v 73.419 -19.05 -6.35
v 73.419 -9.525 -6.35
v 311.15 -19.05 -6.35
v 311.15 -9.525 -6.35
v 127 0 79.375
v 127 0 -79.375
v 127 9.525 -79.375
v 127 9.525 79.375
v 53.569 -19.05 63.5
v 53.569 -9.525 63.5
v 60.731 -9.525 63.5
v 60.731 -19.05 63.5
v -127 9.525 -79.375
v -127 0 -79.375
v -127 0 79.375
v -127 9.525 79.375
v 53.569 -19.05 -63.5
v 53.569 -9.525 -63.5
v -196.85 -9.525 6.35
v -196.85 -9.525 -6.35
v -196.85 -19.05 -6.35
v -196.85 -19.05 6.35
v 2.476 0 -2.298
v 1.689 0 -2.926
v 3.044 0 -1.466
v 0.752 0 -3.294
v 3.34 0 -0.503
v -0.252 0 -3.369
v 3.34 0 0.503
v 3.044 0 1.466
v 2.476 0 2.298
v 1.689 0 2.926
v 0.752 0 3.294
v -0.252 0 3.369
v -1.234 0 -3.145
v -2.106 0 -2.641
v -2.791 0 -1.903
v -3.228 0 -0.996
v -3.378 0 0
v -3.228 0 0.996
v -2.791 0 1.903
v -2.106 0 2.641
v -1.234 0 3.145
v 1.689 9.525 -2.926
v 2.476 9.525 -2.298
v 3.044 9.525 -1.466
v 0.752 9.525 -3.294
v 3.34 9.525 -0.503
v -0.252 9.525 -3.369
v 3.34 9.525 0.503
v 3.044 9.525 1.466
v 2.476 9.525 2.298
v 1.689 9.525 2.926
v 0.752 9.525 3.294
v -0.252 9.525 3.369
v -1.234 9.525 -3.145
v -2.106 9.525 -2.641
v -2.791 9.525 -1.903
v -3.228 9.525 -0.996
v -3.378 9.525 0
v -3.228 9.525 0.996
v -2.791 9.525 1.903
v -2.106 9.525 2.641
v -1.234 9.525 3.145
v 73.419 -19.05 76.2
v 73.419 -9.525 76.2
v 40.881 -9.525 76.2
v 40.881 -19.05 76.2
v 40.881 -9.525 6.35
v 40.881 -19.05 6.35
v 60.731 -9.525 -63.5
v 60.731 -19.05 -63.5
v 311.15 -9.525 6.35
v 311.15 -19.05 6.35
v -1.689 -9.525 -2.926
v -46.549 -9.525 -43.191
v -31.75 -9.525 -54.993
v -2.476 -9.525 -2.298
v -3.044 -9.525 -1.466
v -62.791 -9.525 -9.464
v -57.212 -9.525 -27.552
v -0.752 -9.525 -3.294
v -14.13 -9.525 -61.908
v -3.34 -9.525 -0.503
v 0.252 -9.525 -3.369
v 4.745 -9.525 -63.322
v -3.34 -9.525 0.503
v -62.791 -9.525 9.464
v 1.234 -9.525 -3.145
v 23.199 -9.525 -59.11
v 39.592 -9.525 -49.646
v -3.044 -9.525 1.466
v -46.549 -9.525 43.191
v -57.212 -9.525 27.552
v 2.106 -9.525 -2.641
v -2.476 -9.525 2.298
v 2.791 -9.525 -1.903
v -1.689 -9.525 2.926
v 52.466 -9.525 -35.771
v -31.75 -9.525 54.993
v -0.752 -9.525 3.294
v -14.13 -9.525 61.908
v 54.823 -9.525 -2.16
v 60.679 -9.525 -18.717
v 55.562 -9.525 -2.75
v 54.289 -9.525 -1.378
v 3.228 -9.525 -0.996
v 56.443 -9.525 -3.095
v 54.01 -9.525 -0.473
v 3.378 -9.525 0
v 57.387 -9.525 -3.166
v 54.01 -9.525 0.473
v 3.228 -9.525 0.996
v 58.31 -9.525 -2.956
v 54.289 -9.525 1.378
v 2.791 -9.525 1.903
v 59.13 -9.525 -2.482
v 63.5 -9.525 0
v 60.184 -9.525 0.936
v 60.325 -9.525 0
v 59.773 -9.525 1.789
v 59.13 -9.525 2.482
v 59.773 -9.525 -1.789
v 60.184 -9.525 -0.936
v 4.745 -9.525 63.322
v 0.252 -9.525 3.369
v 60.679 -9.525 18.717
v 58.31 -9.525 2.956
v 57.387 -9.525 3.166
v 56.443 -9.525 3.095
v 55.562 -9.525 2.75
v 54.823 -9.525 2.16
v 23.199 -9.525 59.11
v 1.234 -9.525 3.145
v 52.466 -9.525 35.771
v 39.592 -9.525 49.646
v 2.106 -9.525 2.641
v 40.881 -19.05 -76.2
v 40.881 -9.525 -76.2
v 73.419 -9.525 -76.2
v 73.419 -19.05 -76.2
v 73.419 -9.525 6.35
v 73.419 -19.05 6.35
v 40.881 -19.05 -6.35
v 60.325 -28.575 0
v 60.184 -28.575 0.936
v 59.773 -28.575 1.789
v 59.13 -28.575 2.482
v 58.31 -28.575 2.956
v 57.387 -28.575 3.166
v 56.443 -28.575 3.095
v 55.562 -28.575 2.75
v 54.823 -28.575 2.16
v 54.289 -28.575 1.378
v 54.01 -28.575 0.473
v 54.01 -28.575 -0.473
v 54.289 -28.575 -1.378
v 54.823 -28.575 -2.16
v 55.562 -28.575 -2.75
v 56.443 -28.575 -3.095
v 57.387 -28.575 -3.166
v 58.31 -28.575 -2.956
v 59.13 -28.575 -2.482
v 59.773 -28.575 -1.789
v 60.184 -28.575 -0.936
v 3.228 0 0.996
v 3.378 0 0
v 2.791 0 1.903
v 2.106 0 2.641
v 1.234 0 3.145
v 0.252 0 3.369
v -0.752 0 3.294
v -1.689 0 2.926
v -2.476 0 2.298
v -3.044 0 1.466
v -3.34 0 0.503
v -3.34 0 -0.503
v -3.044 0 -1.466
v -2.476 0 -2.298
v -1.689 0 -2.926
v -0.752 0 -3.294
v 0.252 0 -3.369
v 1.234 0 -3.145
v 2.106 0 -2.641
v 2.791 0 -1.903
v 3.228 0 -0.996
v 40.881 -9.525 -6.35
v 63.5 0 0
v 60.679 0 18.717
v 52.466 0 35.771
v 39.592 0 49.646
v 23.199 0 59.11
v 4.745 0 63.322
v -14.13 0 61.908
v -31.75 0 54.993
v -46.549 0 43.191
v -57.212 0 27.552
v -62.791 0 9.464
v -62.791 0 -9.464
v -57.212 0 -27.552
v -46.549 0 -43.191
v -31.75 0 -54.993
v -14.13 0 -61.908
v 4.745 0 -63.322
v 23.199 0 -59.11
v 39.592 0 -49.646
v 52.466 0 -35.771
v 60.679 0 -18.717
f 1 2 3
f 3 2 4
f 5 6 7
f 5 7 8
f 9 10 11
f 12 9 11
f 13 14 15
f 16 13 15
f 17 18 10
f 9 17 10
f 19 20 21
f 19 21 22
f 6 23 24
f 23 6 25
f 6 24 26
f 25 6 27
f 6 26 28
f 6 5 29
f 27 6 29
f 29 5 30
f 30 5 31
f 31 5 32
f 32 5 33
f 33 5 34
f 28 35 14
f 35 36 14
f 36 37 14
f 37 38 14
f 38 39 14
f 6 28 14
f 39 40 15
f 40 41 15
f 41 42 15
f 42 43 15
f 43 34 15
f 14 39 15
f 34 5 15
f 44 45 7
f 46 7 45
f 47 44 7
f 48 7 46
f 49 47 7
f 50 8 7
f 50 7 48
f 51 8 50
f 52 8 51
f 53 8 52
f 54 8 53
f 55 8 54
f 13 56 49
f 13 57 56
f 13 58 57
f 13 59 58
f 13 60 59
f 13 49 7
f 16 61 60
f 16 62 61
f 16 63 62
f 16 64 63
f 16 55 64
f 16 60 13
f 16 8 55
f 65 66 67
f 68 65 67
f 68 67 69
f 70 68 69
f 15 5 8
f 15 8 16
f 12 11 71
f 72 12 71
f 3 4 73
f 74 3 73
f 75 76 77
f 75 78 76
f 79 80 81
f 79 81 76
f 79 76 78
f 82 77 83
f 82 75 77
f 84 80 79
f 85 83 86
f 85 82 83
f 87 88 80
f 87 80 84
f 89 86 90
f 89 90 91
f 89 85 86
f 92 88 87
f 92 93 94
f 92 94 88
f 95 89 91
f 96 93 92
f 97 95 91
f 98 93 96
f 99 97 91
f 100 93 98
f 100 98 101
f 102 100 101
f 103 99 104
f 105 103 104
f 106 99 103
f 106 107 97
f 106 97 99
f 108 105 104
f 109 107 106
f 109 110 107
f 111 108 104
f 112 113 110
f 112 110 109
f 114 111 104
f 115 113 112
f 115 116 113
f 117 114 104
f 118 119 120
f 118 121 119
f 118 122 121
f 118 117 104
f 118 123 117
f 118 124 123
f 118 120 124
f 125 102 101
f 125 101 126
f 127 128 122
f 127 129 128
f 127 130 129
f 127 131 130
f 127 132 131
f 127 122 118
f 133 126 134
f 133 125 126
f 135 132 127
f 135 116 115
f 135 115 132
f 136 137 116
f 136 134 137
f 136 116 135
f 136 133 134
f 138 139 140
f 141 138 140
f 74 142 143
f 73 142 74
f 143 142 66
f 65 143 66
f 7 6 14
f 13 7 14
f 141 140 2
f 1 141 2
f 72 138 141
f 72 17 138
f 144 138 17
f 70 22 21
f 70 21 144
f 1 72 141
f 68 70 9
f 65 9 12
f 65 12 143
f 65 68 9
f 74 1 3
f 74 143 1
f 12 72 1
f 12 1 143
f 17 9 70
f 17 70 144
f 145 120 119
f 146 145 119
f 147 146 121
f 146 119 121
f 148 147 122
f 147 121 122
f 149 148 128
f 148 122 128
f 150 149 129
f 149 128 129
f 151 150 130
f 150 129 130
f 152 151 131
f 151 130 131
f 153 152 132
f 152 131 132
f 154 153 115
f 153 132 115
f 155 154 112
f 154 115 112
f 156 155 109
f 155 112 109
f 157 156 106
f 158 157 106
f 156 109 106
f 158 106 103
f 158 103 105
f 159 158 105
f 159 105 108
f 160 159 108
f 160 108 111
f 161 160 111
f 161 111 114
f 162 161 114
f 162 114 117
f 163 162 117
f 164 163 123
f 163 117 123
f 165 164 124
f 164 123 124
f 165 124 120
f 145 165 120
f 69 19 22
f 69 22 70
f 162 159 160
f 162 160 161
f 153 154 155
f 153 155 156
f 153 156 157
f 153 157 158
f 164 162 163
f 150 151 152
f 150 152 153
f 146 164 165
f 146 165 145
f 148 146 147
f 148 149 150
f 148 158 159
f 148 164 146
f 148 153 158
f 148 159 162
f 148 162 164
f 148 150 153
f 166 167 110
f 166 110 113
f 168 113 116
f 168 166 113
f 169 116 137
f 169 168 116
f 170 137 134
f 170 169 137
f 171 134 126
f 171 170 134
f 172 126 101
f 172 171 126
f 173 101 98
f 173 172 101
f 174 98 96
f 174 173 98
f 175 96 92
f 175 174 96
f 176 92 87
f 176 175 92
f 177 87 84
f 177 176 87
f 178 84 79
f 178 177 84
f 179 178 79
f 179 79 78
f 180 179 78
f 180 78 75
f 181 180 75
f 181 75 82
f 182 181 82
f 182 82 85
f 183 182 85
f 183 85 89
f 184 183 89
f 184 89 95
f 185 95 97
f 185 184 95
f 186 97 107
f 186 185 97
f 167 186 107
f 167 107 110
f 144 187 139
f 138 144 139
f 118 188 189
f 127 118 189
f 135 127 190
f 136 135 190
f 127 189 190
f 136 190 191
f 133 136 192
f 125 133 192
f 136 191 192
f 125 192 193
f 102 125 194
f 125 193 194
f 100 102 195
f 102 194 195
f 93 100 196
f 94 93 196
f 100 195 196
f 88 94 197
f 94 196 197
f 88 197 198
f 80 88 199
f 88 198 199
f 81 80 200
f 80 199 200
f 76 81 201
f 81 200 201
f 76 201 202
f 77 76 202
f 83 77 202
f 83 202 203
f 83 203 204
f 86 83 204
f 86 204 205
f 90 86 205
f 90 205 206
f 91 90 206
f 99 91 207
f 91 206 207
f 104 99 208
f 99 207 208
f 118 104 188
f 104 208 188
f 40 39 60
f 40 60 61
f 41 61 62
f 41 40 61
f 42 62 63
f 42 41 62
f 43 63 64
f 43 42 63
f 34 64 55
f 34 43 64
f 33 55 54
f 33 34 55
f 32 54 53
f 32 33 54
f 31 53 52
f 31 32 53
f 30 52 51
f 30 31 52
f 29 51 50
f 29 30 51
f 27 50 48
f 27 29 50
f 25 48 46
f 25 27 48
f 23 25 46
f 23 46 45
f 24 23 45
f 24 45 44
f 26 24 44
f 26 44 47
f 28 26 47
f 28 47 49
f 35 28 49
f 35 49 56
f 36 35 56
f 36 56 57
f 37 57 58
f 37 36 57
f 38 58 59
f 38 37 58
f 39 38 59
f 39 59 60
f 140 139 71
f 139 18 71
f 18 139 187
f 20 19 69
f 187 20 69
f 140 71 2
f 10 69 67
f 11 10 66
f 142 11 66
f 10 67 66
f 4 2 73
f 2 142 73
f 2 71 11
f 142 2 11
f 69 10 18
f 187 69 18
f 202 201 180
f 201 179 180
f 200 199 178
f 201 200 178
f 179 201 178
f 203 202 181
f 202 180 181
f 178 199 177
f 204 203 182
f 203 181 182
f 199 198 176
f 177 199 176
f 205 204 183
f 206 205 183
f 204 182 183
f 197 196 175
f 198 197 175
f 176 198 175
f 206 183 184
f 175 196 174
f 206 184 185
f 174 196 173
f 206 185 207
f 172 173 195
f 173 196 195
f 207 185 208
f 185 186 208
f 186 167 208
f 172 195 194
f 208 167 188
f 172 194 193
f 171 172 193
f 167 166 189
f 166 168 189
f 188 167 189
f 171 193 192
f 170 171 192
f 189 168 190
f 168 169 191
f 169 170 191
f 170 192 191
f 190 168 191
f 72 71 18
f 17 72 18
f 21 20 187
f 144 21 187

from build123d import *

# Parameters (mm, degrees)
F1_R     = 63.5
F1_R_2   = 3.3782
F2_DEPTH = 9.525
F3_R     = 3.175
F4_DEPTH = 19.05
F3_W     = 12.6873
F3_H     = 12.7
F3_W_2   = 237.7313
F5_DEPTH = 9.525
F6_W     = 254
F6_H     = 158.75
F6_R     = 63.5
F6_R_2   = 3.3782
F7_DEPTH = 9.525


with BuildPart() as f2:
    # F1 (on Front) → F2 (new body)
    with BuildSketch(Plane.XZ):
        Circle(F1_R)
        Circle(F1_R_2, mode=Mode.SUBTRACT)
    extrude(amount=F2_DEPTH)

    # F3 (on face) → F4 (join)
    with BuildSketch(Plane.XZ.offset(9.525)):
        with Locations((57.15, 0)):
            Circle(F3_R)
    extrude(amount=F4_DEPTH)


with BuildPart() as f5:
    # F3 (on face) → F5 (new body)
    with BuildSketch(Plane.XZ.offset(9.525)):
        Polygon((53.5686, 6.35), (53.5686, 63.5), (60.7314, 63.5), (60.7314, 6.35), (73.4187, 6.35), (73.4187, 76.2), (40.8813, 76.2), (40.8813, 6.35), align=None)
        with Locations((47.22495, 0)):
            Rectangle(F3_W, F3_H)
        with Locations((67.07505, 0)):
            Rectangle(F3_W, F3_H)
        Polygon((53.5686, -63.5), (53.5686, -6.35), (40.8813, -6.35), (40.8813, -76.2), (73.4187, -76.2), (73.4187, -6.35), (60.7314, -6.35), (60.7314, -63.5), align=None)
        with Locations((-77.98435, 0)):
            Rectangle(F3_W_2, F3_H)
        with Locations((192.28435, 0)):
            Rectangle(F3_W_2, F3_H)
    extrude(amount=F5_DEPTH)


with BuildPart() as f7:
    # F6 (on face) → F7 (new body)
    with BuildSketch(Plane(origin=(0, 0, 0), x_dir=(-1, 0, 0), z_dir=(0, 1, 0))):
        Rectangle(F6_W, F6_H)
        Circle(F6_R, mode=Mode.SUBTRACT)
        Circle(F6_R)
        Circle(F6_R_2, mode=Mode.SUBTRACT)
    extrude(amount=F7_DEPTH)


solid = Compound([f2.part, f5.part, f7.part])
